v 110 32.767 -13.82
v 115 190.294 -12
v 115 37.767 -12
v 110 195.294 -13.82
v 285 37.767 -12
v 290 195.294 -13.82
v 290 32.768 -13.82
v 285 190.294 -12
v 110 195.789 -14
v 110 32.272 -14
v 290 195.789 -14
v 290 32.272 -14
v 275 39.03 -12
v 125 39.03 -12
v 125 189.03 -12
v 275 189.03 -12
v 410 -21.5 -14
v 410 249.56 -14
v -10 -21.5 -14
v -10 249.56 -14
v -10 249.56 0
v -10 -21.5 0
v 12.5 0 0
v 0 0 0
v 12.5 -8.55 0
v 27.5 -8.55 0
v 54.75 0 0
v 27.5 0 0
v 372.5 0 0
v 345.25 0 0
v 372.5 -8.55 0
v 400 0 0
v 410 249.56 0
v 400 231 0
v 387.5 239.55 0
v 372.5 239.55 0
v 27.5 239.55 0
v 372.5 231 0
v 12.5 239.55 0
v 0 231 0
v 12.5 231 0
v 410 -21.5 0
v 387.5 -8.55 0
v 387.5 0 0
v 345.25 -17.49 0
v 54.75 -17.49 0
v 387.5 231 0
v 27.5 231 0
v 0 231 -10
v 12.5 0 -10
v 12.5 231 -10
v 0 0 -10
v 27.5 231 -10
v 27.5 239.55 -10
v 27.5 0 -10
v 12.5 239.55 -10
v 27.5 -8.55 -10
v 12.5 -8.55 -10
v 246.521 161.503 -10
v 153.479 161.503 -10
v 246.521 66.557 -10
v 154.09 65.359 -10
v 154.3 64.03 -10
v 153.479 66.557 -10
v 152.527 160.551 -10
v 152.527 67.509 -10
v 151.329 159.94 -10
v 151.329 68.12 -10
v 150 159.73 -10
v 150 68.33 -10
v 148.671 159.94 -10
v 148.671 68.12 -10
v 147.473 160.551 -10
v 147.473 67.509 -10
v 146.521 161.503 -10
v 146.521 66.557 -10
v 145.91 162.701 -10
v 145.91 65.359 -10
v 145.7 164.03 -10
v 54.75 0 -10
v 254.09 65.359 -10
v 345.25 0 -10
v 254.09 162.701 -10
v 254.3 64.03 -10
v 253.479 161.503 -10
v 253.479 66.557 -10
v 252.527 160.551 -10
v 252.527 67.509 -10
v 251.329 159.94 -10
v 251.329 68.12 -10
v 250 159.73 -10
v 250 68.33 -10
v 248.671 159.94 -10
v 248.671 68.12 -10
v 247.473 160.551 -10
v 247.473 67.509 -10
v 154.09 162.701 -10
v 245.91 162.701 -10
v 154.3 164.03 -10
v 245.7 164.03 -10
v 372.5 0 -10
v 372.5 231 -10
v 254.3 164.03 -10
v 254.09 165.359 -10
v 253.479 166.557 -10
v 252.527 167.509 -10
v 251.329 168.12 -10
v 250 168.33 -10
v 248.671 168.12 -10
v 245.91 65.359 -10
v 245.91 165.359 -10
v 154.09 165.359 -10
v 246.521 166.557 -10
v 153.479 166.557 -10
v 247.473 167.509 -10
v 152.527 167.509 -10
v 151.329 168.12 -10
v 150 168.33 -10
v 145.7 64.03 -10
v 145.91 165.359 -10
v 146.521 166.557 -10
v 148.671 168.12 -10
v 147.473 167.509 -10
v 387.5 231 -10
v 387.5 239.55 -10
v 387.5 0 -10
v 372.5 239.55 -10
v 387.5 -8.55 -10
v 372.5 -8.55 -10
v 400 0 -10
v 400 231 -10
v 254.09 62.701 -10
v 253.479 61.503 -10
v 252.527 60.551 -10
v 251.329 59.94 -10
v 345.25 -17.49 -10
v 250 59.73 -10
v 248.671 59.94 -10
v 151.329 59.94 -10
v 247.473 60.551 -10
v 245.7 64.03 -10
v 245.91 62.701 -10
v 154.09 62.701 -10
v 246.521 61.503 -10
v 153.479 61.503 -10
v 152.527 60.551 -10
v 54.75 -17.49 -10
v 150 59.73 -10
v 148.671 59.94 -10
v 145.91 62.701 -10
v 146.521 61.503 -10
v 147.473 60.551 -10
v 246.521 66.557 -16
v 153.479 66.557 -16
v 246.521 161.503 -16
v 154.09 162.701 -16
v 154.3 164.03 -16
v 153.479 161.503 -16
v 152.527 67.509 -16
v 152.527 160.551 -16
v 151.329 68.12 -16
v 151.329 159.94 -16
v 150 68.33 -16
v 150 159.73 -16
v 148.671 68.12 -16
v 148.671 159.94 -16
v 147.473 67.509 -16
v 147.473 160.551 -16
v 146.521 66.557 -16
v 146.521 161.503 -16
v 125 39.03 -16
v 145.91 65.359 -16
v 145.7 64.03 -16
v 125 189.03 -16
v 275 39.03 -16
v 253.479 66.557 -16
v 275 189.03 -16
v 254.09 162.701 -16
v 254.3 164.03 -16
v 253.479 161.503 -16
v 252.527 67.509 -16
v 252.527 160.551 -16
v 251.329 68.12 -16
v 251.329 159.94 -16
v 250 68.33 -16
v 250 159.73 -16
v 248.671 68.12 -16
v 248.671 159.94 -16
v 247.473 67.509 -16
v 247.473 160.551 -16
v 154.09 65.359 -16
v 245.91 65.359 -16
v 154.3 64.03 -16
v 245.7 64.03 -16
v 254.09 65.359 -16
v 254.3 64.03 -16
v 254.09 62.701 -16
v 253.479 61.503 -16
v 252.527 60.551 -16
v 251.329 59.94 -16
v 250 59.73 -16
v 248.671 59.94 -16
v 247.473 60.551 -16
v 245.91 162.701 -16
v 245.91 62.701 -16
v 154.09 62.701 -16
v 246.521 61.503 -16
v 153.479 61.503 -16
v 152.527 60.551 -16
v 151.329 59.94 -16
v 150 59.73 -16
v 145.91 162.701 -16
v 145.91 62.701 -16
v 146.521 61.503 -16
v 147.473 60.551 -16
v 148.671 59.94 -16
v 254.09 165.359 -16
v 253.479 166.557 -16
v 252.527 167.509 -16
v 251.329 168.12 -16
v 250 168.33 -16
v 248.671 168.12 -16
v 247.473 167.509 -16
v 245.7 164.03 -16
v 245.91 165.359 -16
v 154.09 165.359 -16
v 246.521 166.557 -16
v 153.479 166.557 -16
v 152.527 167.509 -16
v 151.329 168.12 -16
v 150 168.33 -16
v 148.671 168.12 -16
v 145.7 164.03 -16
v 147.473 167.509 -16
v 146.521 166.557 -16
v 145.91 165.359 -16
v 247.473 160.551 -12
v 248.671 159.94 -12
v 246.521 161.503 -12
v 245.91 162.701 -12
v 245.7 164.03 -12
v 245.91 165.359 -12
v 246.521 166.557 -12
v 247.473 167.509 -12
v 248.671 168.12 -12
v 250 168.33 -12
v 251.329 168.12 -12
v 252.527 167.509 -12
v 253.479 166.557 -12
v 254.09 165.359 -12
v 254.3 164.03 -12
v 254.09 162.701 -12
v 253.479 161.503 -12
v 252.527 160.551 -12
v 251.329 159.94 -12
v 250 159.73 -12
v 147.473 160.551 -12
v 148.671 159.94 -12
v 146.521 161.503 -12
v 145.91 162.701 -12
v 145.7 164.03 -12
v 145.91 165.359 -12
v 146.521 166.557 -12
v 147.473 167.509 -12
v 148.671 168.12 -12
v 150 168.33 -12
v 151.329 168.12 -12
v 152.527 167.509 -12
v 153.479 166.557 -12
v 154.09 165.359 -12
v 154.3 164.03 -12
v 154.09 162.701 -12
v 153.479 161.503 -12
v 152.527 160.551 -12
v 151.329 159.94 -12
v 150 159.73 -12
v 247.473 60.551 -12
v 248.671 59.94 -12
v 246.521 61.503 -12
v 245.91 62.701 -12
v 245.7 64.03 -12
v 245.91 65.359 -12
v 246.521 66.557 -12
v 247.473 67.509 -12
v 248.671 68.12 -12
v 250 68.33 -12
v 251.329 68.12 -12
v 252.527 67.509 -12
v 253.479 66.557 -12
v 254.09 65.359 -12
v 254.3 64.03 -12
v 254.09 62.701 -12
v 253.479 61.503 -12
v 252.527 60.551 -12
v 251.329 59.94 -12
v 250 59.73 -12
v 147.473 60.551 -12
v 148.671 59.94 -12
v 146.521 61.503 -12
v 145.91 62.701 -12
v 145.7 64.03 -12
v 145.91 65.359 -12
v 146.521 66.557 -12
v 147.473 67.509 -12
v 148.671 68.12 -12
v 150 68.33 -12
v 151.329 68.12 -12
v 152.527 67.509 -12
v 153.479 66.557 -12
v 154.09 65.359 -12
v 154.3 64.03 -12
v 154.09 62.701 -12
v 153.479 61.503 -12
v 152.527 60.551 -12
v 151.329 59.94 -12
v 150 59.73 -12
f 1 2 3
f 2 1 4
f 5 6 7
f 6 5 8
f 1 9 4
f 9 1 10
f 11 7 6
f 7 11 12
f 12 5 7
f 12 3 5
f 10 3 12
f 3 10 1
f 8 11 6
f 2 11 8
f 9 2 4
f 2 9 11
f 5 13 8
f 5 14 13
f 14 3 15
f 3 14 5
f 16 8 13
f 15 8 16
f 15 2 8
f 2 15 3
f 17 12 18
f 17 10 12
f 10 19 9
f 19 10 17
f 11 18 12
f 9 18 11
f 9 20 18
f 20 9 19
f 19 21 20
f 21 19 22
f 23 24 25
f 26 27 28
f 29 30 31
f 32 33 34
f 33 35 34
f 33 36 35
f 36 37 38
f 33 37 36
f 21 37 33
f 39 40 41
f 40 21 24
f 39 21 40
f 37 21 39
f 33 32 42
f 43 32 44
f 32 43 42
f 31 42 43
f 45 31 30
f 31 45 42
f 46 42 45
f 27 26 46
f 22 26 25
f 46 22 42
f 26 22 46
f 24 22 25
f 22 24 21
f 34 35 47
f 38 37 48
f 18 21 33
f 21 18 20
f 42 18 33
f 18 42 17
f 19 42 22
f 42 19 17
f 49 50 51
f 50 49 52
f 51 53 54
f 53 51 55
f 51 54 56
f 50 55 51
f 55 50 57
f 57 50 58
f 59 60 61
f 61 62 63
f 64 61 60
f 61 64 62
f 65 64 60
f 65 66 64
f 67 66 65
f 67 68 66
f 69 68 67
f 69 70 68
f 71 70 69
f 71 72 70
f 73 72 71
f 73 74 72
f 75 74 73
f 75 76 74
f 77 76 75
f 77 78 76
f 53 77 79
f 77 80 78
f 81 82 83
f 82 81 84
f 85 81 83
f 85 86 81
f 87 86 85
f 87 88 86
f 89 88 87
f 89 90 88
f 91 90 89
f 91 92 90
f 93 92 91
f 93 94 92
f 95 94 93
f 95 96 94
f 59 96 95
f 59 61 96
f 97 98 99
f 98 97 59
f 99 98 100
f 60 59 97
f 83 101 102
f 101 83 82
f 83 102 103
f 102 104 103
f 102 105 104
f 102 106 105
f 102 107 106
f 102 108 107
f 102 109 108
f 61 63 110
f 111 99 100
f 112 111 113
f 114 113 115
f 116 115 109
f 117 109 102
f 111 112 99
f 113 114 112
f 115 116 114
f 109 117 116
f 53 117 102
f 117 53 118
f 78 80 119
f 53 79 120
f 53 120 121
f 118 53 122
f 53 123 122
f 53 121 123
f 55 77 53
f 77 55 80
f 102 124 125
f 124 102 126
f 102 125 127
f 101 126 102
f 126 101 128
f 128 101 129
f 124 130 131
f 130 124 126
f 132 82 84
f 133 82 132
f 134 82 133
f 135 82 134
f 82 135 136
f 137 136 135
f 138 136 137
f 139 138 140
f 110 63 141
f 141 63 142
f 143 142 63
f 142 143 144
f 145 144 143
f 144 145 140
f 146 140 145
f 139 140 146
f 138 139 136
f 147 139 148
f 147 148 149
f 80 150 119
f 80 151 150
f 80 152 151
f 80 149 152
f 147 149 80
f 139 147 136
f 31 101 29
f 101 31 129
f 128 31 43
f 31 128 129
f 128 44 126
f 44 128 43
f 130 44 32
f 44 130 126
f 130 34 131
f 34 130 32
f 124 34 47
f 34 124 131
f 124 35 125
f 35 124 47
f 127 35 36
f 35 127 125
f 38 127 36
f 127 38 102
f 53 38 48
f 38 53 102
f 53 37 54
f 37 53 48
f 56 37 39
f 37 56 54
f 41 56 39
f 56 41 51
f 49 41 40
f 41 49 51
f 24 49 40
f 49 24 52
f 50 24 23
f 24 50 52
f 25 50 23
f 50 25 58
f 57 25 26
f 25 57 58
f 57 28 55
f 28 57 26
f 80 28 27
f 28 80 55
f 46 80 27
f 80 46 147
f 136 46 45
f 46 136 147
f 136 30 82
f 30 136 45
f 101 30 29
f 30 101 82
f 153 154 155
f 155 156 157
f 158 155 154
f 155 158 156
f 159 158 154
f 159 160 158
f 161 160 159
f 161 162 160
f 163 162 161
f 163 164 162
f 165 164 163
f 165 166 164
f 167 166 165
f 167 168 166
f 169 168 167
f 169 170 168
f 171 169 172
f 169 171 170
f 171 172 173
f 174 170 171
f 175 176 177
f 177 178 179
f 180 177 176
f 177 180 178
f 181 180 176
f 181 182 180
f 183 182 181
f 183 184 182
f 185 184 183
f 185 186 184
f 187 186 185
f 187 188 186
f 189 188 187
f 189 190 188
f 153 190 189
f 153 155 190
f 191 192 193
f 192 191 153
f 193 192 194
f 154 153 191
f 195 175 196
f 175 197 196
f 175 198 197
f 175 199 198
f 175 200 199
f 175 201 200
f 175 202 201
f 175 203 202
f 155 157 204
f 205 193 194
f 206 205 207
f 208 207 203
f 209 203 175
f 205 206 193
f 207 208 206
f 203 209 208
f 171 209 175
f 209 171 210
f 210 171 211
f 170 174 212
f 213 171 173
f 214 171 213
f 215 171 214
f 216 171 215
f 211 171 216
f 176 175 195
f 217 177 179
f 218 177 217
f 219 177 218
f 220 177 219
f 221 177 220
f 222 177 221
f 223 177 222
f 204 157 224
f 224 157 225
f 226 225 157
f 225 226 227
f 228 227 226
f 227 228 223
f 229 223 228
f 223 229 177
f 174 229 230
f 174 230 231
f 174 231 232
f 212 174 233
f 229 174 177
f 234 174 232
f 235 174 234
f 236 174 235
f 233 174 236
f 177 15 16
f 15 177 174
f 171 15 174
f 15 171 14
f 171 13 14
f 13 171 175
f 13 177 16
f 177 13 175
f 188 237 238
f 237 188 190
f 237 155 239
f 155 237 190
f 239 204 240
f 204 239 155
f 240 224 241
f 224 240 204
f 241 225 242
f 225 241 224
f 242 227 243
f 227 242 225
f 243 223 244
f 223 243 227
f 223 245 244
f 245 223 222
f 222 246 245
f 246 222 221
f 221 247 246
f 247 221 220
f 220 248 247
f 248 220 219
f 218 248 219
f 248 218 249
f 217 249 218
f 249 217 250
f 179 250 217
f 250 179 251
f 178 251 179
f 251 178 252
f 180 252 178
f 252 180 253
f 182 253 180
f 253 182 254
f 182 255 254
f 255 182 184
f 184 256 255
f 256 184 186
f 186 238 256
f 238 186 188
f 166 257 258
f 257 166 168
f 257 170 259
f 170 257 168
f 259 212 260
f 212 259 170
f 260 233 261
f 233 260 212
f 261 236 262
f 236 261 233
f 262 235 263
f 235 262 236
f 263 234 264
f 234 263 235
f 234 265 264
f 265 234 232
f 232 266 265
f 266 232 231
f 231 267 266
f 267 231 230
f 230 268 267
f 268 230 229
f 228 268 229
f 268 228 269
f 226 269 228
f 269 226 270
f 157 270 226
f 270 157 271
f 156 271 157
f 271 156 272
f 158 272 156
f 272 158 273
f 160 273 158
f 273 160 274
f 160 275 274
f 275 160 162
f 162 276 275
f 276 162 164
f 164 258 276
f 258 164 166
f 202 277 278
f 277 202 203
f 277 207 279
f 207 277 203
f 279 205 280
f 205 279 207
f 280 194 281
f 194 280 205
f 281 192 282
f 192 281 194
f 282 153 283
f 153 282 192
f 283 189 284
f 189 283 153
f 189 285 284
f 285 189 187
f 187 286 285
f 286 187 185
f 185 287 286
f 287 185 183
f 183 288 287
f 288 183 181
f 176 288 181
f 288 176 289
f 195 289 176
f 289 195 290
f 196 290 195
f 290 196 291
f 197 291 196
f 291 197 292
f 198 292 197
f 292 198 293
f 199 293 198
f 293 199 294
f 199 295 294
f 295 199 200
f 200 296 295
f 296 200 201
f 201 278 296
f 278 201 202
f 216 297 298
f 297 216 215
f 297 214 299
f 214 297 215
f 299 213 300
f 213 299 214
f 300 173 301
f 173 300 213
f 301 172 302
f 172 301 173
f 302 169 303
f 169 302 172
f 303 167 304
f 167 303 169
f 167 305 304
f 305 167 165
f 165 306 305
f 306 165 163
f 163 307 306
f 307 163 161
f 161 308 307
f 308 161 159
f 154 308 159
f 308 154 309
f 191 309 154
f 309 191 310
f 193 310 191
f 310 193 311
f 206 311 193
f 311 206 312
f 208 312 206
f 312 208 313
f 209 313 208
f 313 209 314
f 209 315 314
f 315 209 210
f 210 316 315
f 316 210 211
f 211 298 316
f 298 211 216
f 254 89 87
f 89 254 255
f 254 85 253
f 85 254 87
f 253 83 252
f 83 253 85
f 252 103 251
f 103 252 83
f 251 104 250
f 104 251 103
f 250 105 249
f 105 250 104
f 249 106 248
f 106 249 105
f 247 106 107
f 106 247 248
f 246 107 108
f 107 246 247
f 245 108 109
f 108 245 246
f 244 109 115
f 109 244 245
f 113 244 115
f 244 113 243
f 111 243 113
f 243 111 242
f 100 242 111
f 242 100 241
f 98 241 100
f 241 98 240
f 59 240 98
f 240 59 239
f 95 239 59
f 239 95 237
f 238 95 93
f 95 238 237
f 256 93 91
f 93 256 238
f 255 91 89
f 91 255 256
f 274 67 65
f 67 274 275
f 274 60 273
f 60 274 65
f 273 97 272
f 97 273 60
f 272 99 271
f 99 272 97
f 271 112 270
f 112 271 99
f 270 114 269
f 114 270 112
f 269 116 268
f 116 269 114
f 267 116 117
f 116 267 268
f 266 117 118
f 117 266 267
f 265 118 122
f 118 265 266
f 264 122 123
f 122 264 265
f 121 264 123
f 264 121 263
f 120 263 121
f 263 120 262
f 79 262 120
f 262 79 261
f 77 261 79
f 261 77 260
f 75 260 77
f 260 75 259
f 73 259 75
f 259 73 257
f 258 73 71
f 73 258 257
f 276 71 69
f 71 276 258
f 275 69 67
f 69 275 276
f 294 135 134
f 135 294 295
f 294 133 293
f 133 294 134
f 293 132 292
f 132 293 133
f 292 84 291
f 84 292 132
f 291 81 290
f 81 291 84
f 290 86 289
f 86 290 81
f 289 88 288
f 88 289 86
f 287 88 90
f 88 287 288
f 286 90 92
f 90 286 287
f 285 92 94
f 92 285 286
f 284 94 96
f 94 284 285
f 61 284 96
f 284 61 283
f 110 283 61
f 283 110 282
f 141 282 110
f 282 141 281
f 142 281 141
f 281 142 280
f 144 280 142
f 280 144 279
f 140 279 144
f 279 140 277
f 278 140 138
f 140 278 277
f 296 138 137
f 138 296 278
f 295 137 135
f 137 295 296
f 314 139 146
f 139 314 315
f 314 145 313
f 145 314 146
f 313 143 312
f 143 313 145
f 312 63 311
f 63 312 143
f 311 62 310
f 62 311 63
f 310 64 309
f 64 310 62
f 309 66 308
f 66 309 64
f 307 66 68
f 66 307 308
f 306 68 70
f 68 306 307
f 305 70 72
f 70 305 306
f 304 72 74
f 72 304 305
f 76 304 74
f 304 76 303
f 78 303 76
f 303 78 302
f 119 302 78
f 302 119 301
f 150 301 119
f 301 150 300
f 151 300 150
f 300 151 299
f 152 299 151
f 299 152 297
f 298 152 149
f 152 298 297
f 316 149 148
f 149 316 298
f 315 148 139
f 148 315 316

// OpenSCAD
$fn = 20;

difference() {
	union() {
		difference() {
			translate(v = [0, 0, -14]) {
				linear_extrude(height = 14) {
					translate(v = [0, -1.4699999999999989, 0]) {
						translate(v = [-10.0, -20.03, 0.0]) {
							color(alpha = 1.0, c = [0.962272393509669, 0.3976451968965351, 0.8008274363432775]) {
								square(size = [420, 271.06]);
							}
						}
					}
				}
			}
			translate(v = [0, 0, -10]) {
				linear_extrude(height = 10.01) {
					union() {
						color(alpha = 1.0, c = [0.9677975592919913, 0.44127456009157356, 0.5358103155058701]) {
							square(size = [400, 231]);
						}
						translate(v = [0, -121.24, 0]) {
							translate(v = [54.75, 109.75, 0.0]) {
								color(alpha = 1.0, c = [0.8616090647292522, 0.536495730113334, 0.19548899031476086]) {
									square(size = [290.5, 11.5]);
								}
							}
						}
						translate(v = [0, -6, 0]) {
							translate(v = [0, -121.24, 0]) {
								translate(v = [54.75, 109.75, 0.0]) {
									color(alpha = 1.0, c = [0.8616090647292522, 0.536495730113334, 0.19548899031476086]) {
										square(size = [290.5, 11.5]);
									}
								}
							}
						}
						translate(v = [180.0, 119.77, 0.0]) {
							translate(v = [192.5, 111.22, 0.0]) {
								color(alpha = 1.0, c = [0.21044753832183283, 0.6773105080456748, 0.6433941168468681]) {
									square(size = [15, 8.56]);
								}
							}
						}
						translate(v = [-180.0, 119.77, 0.0]) {
							translate(v = [192.5, 111.22, 0.0]) {
								color(alpha = 1.0, c = [0.21044753832183283, 0.6773105080456748, 0.6433941168468681]) {
									square(size = [15, 8.56]);
								}
							}
						}
						translate(v = [180.0, -119.77, 0.0]) {
							translate(v = [192.5, 111.22, 0.0]) {
								color(alpha = 1.0, c = [0.21044753832183283, 0.6773105080456748, 0.6433941168468681]) {
									square(size = [15, 8.56]);
								}
							}
						}
						translate(v = [-180.0, -119.77, 0.0]) {
							translate(v = [192.5, 111.22, 0.0]) {
								color(alpha = 1.0, c = [0.21044753832183283, 0.6773105080456748, 0.6433941168468681]) {
									square(size = [15, 8.56]);
								}
							}
						}
					}
				}
			}
			translate(v = [0, 0, -22]) {
				translate(v = [0, -1.4699999999999989, 0]) {
					translate(v = [110.0, 25.5, 0.0]) {
						color(alpha = 1.0, c = [0.7, 0.6, 0.8]) {
							difference() {
								cube(size = [180, 180, 10]);
								union() {
									translate(v = [175, 0, 0]) {
										rotate(a = [0, 70, 0]) {
											cube(size = [180, 180, 10]);
										}
									}
									translate(v = [0, 0, 1.819792878320459]) {
										rotate(a = [0, 110, 0]) {
											cube(size = [180, 180, 10]);
										}
									}
									translate(v = [5, 0, 10]) {
										rotate(a = [0, 250, 0]) {
											cube(size = [180, 180, 10]);
										}
									}
									translate(v = [180, 0, 8.18020712167954]) {
										rotate(a = [0, 290, 0]) {
											cube(size = [180, 180, 10]);
										}
									}
								}
								union() {
									translate(v = [0, 0, 5]) {
										rotate(a = [20, 0, 0]) {
											cube(size = [180, 180, 10]);
										}
									}
									translate(v = [0, 13.735847130222057, 0]) {
										rotate(a = [160, 0, 0]) {
											cube(size = [180, 180, 10]);
										}
									}
									translate(v = [0, 180, 5]) {
										rotate(a = [200, 0, 0]) {
											cube(size = [180, 180, 10]);
										}
									}
									translate(v = [0, 166.26415286977794, 10]) {
										rotate(a = [340, 0, 0]) {
											cube(size = [180, 180, 10]);
										}
									}
								}
							}
						}
					}
				}
			}
		}
		translate(v = [0, 0, -16]) {
			translate(v = [0, -1.4699999999999989, 0]) {
				color(alpha = 1.0, c = [0.3, 0.5, 0.1]) {
					linear_extrude(height = 4) {
						translate(v = [125.0, 40.5, 0.0]) {
							difference() {
								color(alpha = 1.0, c = [0.46810256823426105, 0.6699492535792404, 0.1928958739904499]) {
									square(size = [150, 150]);
								}
								translate(v = [50, 50, 0]) {
									translate(v = [75.0, 75.0, 0.0]) {
										color(alpha = 1.0, c = [0.962272393509669, 0.3976451968965351, 0.8008274363432775]) {
											circle(r = 4.3);
										}
									}
								}
								translate(v = [-50, 50, 0]) {
									translate(v = [75.0, 75.0, 0.0]) {
										color(alpha = 1.0, c = [0.962272393509669, 0.3976451968965351, 0.8008274363432775]) {
											circle(r = 4.3);
										}
									}
								}
								translate(v = [50, -50, 0]) {
									translate(v = [75.0, 75.0, 0.0]) {
										color(alpha = 1.0, c = [0.962272393509669, 0.3976451968965351, 0.8008274363432775]) {
											circle(r = 4.3);
										}
									}
								}
								translate(v = [-50, -50, 0]) {
									translate(v = [75.0, 75.0, 0.0]) {
										color(alpha = 1.0, c = [0.962272393509669, 0.3976451968965351, 0.8008274363432775]) {
											circle(r = 4.3);
										}
									}
								}
							}
						}
					}
				}
			}
		}
	}
	translate(v = [0, 0, -12]) {
		translate(v = [0, -1.4699999999999989, 0]) {
			color(alpha = 1.0, c = [0.3, 0.9, 0.1]) {
				linear_extrude(height = 4) {
					translate(v = [125.0, 40.5, 0.0]) {
						union() {
							translate(v = [50, 50, 0]) {
								translate(v = [75.0, 75.0, 0.0]) {
									color(alpha = 1.0, c = [0.962272393509669, 0.3976451968965351, 0.8008274363432775]) {
										circle(r = 4.3);
									}
								}
							}
							translate(v = [-50, 50, 0]) {
								translate(v = [75.0, 75.0, 0.0]) {
									color(alpha = 1.0, c = [0.962272393509669, 0.3976451968965351, 0.8008274363432775]) {
										circle(r = 4.3);
									}
								}
							}
							translate(v = [50, -50, 0]) {
								translate(v = [75.0, 75.0, 0.0]) {
									color(alpha = 1.0, c = [0.962272393509669, 0.3976451968965351, 0.8008274363432775]) {
										circle(r = 4.3);
									}
								}
							}
							translate(v = [-50, -50, 0]) {
								translate(v = [75.0, 75.0, 0.0]) {
									color(alpha = 1.0, c = [0.962272393509669, 0.3976451968965351, 0.8008274363432775]) {
										circle(r = 4.3);
									}
								}
							}
						}
					}
				}
			}
		}
	}
}
